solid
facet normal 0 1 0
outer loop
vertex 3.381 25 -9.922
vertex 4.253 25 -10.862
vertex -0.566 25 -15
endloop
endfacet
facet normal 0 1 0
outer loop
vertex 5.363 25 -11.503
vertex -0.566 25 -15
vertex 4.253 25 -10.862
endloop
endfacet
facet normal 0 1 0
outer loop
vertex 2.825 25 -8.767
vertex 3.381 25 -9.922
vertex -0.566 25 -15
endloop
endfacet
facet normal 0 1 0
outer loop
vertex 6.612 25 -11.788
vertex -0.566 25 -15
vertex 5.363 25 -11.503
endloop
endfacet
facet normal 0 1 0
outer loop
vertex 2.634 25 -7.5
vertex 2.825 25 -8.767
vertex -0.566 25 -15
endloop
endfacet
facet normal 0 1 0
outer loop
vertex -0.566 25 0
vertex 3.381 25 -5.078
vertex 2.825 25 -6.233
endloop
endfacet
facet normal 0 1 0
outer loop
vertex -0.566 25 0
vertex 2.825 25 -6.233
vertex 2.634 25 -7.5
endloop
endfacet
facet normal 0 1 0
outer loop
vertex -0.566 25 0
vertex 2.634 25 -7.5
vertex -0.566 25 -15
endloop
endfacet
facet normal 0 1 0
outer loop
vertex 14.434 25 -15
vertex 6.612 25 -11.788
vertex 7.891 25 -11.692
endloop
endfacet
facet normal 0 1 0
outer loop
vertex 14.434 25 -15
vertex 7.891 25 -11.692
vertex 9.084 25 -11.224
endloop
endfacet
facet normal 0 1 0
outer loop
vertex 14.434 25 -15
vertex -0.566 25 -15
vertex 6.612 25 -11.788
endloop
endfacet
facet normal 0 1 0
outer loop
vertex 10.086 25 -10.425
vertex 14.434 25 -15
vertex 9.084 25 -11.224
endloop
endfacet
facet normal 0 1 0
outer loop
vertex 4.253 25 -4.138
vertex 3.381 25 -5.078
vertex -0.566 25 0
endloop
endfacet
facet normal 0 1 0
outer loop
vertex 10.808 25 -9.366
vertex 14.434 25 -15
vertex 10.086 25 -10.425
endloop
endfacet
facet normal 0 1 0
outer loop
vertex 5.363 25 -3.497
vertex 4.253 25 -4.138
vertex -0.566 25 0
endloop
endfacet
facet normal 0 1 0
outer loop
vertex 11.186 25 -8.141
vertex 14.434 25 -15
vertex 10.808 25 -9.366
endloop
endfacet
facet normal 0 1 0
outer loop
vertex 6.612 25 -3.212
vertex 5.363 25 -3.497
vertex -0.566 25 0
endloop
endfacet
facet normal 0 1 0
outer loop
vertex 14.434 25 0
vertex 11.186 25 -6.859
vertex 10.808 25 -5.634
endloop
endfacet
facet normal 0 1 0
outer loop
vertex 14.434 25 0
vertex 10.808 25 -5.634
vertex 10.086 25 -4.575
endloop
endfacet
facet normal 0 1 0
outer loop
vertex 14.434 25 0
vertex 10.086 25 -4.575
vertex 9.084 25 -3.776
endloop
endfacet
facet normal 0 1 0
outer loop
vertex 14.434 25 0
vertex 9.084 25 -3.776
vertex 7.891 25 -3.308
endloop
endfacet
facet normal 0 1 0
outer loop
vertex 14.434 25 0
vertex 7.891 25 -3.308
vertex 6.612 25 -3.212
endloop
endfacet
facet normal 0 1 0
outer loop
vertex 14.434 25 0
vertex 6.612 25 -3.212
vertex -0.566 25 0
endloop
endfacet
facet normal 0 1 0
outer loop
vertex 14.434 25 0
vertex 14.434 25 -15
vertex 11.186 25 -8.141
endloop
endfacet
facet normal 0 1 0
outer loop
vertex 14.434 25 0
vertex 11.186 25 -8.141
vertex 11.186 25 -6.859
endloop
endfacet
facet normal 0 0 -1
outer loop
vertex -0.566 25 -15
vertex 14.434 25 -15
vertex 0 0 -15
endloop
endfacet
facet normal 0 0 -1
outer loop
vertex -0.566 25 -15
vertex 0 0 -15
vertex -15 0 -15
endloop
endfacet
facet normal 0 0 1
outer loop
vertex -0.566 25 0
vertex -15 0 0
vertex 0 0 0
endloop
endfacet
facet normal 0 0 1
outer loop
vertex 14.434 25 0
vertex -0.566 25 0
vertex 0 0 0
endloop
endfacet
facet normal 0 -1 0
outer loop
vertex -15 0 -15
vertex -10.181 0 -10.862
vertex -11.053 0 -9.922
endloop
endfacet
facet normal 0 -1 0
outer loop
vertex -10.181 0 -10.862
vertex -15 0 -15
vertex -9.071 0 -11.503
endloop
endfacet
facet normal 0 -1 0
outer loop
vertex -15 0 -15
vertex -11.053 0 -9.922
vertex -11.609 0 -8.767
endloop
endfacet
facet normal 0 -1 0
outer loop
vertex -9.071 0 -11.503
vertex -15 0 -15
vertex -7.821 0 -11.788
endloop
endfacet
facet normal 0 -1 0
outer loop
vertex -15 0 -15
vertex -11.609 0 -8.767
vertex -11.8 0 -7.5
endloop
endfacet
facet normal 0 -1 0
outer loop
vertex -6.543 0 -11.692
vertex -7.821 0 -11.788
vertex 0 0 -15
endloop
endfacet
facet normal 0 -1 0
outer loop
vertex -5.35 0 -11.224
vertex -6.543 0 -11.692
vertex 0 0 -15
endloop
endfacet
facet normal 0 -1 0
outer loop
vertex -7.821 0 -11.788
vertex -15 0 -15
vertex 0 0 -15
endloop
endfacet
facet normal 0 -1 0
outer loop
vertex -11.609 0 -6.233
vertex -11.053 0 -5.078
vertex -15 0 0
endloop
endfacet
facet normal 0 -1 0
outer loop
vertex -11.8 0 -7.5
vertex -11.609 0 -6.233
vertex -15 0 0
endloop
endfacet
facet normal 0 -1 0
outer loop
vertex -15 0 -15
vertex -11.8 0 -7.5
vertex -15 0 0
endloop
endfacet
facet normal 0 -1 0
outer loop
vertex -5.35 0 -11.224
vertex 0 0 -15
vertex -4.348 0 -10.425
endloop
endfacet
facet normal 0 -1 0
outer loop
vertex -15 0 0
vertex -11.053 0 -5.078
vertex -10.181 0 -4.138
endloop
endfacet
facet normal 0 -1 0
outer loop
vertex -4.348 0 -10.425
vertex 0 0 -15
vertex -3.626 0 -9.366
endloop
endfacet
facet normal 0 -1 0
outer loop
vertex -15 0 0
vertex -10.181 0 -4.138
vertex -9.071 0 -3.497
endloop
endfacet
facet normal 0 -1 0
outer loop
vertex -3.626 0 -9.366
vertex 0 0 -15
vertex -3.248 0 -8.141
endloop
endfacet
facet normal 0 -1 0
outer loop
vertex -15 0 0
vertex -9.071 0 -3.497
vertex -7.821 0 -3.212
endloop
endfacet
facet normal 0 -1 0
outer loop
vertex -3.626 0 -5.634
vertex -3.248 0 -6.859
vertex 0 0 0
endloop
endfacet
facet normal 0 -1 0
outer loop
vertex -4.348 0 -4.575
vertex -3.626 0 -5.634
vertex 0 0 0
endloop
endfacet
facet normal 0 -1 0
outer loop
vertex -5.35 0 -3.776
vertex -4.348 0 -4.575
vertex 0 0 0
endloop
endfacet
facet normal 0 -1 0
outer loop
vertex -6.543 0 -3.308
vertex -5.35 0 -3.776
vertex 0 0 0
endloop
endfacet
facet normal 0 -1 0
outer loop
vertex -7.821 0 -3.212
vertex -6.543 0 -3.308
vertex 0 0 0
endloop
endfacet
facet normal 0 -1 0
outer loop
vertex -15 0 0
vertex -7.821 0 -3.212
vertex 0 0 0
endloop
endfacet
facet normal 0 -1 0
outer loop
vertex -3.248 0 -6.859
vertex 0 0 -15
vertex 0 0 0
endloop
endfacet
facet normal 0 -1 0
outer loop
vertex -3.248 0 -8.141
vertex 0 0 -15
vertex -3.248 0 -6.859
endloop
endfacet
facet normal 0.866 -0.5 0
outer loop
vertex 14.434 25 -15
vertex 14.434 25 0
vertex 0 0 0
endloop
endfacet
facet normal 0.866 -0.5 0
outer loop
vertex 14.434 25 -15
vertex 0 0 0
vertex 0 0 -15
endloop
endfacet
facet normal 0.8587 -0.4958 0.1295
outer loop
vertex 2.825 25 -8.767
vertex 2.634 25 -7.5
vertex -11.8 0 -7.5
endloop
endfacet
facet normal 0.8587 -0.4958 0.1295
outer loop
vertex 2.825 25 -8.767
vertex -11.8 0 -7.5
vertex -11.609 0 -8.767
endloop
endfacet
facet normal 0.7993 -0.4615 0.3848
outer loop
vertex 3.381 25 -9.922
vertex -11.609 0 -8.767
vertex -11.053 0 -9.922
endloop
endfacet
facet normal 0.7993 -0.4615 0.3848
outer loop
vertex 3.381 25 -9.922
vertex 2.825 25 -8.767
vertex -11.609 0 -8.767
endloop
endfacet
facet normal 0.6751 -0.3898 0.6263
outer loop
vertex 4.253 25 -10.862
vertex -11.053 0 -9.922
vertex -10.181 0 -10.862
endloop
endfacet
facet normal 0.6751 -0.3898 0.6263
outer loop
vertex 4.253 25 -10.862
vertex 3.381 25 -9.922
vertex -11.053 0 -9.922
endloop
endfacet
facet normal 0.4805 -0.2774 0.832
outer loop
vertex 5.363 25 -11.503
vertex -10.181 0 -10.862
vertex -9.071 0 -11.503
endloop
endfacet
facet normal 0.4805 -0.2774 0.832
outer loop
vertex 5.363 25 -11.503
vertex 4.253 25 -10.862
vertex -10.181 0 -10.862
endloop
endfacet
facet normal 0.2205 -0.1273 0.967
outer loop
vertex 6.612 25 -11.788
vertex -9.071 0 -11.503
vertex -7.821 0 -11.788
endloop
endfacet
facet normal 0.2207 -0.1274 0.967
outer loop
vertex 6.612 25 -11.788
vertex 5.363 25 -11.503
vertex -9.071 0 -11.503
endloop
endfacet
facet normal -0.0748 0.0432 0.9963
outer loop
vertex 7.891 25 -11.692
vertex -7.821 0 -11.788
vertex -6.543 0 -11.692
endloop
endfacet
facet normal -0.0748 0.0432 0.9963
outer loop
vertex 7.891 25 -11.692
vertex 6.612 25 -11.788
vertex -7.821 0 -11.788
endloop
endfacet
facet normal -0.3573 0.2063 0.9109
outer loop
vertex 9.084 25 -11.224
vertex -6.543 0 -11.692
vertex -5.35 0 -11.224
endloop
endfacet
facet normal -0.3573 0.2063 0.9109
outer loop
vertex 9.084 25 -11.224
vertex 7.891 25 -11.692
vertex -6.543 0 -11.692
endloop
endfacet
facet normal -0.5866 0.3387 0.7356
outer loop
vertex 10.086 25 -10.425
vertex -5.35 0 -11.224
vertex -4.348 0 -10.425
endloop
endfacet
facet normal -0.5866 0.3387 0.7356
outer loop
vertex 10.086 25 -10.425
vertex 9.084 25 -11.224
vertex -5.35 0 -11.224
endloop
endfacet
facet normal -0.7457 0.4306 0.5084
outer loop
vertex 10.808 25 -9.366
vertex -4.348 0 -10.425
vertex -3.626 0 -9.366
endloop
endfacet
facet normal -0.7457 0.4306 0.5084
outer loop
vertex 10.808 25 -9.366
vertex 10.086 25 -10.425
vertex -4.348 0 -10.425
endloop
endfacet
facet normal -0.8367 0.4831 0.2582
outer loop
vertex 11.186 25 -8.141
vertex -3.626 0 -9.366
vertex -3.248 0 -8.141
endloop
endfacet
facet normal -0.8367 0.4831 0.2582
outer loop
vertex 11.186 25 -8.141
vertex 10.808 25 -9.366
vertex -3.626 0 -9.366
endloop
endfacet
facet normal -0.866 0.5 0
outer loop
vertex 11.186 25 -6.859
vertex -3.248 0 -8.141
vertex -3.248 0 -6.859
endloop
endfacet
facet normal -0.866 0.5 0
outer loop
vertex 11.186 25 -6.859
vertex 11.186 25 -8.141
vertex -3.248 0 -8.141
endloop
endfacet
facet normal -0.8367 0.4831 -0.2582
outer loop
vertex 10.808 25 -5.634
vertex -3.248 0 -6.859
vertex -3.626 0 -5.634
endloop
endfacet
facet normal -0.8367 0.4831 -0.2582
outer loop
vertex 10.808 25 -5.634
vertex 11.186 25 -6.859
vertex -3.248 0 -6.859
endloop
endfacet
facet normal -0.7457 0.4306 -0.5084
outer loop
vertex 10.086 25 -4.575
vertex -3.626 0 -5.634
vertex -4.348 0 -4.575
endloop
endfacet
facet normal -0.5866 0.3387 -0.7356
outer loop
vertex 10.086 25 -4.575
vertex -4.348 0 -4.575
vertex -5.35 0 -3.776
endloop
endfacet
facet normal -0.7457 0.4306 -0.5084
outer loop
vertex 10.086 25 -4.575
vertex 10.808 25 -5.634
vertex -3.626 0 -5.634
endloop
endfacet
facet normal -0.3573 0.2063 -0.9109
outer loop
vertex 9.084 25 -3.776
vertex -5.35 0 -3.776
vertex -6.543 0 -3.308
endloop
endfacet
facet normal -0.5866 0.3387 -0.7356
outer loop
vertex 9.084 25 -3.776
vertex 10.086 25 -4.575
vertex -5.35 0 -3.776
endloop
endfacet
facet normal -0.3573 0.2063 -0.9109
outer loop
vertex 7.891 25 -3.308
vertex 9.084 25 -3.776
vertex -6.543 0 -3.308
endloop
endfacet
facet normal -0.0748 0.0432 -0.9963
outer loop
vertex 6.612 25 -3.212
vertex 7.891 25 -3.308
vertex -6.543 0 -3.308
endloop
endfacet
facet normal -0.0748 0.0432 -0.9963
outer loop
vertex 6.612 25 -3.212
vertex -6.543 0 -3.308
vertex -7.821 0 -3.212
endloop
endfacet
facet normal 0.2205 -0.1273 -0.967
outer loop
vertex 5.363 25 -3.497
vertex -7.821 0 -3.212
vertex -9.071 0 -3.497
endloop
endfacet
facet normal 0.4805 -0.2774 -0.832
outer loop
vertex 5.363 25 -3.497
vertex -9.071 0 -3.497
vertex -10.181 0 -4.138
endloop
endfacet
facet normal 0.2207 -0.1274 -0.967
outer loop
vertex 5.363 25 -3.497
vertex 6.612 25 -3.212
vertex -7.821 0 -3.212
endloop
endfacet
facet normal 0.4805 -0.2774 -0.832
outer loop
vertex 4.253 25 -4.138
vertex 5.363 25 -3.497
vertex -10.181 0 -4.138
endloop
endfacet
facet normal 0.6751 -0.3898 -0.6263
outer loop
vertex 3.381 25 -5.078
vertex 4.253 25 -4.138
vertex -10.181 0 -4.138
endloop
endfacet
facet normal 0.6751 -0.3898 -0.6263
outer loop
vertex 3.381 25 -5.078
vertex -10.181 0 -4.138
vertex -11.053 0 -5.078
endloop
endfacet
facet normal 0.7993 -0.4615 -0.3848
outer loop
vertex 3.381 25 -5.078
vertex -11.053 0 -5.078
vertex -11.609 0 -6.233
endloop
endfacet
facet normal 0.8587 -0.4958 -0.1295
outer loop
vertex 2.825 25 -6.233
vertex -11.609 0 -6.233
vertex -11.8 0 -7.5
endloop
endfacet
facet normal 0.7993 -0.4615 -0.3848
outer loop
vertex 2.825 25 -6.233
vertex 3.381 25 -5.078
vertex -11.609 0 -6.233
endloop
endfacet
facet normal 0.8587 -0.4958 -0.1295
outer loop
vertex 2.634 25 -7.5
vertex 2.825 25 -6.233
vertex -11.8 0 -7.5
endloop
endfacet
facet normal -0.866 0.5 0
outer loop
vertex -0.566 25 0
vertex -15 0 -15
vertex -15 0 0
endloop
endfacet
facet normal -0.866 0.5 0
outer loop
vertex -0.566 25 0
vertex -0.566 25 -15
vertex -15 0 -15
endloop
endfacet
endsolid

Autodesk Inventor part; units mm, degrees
ref_plane "YZ Plane" through (0, 0, 0) normal (1, 0, 0) x (0, 1, 0)
ref_plane "XZ Plane" through (0, 0, 0) normal (0, 1, 0) x (-1, 0, 0)
ref_plane "XY Plane" through (0, 0, 0) normal (0, 0, 1) x (1, 0, 0)
sketch "Sketch1" plane through (0, 0, 0) normal (0, 1, 0) x (-1, 0, 0)
  line L0 (0, 0) -> (15, 0)
  line L1 (15, 0) -> (15, -15)
  line L2 (15, -15) -> (0, -15)
  line L3 (0, -15) -> (0, 0)
  circle A0 centre (7.5, -7.5) radius 4.3
  dimension "soporte_largo" = 15
  dimension "soporte_ancho" = 15
  dimension "soporte_hueco_diametro" = 8.6
  dimension "soporte_hueco_pos_ancho" = 7.5
  dimension "soporte_hueco_pos_largo" = 7.5
sketch "Sketch2" plane through (0, 0, 0) normal (0, 0, 1) x (1, 0, 0)
  line L0 (0, 0) -> (14.4338, 25)
  line L1 (0, 0) -> (28.8675, 0) construction
  dimension "soporte_inclinacion" = 60
  dimension "soporte_alterura" = 25
sweep "Sweep1" add profiles "Sketch1" path "Sketch2"
equation "\"soporte_hueco_pos_ancho\" = 0.5 * soporte_ancho"
equation "\"soporte_hueco_pos_largo\" = 0.5 * soporte_largo"
equation "\"tol1\" = 0.1"
equation "\"tol2\" = 0.2"
equation "\"tol3\" = 0.3"
equation "\"tol4\" = 0.4"
equation "\"tol5\" = 0.5"
equation "\"tol6\" = 0.6"
equation "\"tol7\" = 0.7"
equation "\"tol8\" = 0.8"
equation "\"tol9\" = 0.9"
equation "\"tol\" = 7"
properties part number "TestSoporte"
